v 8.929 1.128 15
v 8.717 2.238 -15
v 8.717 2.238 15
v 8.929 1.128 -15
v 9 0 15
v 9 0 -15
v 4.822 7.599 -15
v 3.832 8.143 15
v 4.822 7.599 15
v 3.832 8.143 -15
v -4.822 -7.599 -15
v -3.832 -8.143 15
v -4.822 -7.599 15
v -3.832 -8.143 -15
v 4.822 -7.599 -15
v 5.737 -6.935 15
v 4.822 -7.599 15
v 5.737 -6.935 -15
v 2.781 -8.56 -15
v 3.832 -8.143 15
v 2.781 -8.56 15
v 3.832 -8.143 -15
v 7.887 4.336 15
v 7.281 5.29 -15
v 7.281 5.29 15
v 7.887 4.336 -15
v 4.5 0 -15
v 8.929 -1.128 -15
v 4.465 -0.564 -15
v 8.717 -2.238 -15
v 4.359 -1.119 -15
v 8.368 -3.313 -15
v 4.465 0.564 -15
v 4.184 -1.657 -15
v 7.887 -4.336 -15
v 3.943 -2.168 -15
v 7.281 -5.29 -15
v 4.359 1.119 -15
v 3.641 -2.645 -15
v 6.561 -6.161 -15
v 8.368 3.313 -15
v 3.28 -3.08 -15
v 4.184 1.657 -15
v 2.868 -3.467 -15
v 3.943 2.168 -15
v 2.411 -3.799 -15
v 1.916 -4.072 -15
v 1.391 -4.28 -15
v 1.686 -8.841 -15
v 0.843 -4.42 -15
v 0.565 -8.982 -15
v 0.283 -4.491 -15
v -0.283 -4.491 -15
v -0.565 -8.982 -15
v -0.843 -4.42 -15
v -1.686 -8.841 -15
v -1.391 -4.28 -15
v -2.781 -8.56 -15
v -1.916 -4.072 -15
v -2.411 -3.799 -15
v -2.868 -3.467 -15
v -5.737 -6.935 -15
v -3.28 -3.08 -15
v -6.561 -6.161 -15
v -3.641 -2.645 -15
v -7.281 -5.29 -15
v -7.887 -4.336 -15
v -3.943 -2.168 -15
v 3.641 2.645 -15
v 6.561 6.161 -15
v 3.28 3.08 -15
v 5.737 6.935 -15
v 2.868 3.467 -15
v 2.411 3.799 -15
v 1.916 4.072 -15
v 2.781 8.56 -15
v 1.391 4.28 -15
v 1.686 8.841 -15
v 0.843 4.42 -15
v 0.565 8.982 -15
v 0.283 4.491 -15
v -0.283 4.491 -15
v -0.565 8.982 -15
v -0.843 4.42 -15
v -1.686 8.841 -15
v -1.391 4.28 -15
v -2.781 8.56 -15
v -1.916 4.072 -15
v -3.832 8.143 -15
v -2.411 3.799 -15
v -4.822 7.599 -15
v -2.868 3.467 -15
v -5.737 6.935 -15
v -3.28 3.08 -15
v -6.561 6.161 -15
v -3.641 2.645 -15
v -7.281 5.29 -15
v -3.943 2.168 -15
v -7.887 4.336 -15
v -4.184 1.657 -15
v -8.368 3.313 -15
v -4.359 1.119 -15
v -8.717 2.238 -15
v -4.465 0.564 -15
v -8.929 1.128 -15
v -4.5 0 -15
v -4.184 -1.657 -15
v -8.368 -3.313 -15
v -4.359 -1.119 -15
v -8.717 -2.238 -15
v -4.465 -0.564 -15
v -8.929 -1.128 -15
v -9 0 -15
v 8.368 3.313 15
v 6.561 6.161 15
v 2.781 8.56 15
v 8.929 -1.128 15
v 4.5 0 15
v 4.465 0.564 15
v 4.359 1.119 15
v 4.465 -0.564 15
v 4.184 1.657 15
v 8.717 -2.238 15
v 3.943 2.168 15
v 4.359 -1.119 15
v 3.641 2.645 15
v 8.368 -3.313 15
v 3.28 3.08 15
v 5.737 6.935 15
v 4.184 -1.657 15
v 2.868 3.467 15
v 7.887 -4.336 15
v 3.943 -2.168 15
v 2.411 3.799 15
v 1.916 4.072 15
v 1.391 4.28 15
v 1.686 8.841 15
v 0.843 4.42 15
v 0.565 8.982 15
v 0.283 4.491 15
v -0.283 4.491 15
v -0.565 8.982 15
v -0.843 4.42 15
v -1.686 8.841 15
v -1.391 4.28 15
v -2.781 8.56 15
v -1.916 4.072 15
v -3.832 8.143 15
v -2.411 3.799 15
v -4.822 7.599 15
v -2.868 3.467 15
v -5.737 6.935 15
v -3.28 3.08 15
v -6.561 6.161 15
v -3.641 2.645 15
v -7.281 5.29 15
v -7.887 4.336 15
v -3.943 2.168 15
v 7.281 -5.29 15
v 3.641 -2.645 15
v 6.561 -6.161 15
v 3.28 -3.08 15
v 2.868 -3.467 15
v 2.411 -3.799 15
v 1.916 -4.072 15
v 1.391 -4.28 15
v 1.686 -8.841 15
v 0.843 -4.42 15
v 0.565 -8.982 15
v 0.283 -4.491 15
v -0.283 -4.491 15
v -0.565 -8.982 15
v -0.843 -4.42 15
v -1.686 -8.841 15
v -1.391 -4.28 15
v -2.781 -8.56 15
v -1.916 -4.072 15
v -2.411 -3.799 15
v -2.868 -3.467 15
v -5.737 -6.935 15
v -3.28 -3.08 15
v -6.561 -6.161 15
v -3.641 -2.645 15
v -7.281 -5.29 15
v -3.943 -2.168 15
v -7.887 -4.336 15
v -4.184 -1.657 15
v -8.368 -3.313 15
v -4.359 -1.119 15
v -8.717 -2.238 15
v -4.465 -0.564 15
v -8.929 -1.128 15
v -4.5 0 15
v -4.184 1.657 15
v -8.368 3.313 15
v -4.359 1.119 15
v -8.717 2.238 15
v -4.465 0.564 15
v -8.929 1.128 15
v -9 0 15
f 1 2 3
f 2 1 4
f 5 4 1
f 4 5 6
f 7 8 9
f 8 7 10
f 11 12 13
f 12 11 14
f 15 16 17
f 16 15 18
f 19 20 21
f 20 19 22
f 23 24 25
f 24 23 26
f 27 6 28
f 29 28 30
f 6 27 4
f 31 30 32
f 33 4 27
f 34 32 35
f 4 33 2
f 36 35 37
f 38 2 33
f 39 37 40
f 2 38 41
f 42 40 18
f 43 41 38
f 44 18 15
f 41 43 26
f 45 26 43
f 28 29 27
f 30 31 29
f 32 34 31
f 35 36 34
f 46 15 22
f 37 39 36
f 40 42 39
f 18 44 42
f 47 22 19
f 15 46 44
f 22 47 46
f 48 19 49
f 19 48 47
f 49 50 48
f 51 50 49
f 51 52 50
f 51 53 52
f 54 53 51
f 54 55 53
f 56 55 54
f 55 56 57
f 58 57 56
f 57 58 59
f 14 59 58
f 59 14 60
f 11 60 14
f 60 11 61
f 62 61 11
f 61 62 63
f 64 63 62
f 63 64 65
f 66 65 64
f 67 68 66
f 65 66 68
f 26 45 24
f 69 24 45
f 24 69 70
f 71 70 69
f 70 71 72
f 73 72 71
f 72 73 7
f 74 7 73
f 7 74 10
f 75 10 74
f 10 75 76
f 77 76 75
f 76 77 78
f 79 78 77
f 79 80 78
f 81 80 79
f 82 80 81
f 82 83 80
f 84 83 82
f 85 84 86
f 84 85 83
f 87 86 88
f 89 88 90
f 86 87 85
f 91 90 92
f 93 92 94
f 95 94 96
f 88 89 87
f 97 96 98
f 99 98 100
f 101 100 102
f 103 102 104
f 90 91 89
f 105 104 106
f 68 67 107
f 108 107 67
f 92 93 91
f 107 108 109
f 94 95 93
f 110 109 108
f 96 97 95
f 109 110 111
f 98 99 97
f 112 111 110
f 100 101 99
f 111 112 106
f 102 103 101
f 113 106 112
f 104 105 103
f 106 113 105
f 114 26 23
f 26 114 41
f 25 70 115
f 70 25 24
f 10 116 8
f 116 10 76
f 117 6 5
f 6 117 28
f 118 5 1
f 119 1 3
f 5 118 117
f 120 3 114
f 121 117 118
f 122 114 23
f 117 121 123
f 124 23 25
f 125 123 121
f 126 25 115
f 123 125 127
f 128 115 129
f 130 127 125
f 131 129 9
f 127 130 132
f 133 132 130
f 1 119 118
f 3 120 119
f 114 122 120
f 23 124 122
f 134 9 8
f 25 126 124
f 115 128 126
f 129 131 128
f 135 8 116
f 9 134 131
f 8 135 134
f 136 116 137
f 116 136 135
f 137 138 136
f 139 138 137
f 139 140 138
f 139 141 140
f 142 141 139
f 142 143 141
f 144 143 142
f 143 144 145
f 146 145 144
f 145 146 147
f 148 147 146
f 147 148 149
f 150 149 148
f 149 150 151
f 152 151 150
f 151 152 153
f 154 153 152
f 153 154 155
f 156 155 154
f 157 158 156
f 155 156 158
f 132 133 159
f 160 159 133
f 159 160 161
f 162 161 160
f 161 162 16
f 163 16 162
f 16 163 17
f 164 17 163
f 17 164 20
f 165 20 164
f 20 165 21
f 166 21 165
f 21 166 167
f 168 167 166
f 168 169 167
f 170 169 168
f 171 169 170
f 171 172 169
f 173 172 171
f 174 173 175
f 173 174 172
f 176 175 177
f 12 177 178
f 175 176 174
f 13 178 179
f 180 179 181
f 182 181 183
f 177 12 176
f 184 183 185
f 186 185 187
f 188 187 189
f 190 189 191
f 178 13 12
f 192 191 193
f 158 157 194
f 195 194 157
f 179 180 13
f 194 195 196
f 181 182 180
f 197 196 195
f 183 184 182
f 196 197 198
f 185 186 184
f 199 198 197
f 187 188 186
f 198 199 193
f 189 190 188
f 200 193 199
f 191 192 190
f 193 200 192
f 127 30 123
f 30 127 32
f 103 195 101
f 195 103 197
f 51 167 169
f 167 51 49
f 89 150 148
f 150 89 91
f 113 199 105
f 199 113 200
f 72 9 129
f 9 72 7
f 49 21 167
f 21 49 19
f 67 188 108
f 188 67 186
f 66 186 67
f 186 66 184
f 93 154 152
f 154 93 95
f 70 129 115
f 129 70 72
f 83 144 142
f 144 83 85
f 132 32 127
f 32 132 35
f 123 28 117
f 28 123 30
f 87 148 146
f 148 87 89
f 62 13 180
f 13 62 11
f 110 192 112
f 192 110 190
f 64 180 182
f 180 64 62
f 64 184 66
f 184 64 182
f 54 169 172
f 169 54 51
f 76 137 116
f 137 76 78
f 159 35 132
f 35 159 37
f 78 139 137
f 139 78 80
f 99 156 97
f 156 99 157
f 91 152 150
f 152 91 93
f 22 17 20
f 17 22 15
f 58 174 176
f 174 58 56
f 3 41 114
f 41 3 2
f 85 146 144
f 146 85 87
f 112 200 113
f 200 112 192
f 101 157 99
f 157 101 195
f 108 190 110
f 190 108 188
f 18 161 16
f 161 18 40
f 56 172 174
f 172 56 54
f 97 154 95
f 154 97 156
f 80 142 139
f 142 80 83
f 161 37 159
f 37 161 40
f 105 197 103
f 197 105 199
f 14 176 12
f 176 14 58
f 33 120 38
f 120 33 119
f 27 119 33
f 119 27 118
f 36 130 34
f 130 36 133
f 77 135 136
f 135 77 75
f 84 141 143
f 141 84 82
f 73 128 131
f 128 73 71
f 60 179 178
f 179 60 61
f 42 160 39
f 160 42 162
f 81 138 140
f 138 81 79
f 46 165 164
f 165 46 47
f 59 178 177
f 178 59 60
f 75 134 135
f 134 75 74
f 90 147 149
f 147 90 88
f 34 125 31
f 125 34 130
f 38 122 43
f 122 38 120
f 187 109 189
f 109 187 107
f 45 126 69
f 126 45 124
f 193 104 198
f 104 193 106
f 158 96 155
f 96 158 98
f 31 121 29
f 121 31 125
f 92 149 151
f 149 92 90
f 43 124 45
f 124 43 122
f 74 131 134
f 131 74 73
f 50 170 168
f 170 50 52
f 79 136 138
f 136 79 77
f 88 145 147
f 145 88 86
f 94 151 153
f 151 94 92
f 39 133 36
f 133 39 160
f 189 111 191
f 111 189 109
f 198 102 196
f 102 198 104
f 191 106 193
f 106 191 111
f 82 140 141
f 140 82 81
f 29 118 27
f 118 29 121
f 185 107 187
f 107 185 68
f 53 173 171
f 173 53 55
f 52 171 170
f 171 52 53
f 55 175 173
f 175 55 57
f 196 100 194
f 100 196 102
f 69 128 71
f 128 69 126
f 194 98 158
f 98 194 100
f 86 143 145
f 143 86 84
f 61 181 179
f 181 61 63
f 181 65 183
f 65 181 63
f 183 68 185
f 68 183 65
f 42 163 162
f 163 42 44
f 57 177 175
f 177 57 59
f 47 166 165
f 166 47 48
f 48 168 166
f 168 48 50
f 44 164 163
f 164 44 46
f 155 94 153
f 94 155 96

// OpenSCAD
$fn = 50;


difference() {
	union() {
		translate(v = [0, 0, -15.0000000000]) {
			cylinder(h = 30, r = 9.0000000000);
		}
	}
	union() {
		translate(v = [0, 0, -100.0000000000]) {
			cylinder(h = 200, r = 4.5000000000);
		}
	}
}
